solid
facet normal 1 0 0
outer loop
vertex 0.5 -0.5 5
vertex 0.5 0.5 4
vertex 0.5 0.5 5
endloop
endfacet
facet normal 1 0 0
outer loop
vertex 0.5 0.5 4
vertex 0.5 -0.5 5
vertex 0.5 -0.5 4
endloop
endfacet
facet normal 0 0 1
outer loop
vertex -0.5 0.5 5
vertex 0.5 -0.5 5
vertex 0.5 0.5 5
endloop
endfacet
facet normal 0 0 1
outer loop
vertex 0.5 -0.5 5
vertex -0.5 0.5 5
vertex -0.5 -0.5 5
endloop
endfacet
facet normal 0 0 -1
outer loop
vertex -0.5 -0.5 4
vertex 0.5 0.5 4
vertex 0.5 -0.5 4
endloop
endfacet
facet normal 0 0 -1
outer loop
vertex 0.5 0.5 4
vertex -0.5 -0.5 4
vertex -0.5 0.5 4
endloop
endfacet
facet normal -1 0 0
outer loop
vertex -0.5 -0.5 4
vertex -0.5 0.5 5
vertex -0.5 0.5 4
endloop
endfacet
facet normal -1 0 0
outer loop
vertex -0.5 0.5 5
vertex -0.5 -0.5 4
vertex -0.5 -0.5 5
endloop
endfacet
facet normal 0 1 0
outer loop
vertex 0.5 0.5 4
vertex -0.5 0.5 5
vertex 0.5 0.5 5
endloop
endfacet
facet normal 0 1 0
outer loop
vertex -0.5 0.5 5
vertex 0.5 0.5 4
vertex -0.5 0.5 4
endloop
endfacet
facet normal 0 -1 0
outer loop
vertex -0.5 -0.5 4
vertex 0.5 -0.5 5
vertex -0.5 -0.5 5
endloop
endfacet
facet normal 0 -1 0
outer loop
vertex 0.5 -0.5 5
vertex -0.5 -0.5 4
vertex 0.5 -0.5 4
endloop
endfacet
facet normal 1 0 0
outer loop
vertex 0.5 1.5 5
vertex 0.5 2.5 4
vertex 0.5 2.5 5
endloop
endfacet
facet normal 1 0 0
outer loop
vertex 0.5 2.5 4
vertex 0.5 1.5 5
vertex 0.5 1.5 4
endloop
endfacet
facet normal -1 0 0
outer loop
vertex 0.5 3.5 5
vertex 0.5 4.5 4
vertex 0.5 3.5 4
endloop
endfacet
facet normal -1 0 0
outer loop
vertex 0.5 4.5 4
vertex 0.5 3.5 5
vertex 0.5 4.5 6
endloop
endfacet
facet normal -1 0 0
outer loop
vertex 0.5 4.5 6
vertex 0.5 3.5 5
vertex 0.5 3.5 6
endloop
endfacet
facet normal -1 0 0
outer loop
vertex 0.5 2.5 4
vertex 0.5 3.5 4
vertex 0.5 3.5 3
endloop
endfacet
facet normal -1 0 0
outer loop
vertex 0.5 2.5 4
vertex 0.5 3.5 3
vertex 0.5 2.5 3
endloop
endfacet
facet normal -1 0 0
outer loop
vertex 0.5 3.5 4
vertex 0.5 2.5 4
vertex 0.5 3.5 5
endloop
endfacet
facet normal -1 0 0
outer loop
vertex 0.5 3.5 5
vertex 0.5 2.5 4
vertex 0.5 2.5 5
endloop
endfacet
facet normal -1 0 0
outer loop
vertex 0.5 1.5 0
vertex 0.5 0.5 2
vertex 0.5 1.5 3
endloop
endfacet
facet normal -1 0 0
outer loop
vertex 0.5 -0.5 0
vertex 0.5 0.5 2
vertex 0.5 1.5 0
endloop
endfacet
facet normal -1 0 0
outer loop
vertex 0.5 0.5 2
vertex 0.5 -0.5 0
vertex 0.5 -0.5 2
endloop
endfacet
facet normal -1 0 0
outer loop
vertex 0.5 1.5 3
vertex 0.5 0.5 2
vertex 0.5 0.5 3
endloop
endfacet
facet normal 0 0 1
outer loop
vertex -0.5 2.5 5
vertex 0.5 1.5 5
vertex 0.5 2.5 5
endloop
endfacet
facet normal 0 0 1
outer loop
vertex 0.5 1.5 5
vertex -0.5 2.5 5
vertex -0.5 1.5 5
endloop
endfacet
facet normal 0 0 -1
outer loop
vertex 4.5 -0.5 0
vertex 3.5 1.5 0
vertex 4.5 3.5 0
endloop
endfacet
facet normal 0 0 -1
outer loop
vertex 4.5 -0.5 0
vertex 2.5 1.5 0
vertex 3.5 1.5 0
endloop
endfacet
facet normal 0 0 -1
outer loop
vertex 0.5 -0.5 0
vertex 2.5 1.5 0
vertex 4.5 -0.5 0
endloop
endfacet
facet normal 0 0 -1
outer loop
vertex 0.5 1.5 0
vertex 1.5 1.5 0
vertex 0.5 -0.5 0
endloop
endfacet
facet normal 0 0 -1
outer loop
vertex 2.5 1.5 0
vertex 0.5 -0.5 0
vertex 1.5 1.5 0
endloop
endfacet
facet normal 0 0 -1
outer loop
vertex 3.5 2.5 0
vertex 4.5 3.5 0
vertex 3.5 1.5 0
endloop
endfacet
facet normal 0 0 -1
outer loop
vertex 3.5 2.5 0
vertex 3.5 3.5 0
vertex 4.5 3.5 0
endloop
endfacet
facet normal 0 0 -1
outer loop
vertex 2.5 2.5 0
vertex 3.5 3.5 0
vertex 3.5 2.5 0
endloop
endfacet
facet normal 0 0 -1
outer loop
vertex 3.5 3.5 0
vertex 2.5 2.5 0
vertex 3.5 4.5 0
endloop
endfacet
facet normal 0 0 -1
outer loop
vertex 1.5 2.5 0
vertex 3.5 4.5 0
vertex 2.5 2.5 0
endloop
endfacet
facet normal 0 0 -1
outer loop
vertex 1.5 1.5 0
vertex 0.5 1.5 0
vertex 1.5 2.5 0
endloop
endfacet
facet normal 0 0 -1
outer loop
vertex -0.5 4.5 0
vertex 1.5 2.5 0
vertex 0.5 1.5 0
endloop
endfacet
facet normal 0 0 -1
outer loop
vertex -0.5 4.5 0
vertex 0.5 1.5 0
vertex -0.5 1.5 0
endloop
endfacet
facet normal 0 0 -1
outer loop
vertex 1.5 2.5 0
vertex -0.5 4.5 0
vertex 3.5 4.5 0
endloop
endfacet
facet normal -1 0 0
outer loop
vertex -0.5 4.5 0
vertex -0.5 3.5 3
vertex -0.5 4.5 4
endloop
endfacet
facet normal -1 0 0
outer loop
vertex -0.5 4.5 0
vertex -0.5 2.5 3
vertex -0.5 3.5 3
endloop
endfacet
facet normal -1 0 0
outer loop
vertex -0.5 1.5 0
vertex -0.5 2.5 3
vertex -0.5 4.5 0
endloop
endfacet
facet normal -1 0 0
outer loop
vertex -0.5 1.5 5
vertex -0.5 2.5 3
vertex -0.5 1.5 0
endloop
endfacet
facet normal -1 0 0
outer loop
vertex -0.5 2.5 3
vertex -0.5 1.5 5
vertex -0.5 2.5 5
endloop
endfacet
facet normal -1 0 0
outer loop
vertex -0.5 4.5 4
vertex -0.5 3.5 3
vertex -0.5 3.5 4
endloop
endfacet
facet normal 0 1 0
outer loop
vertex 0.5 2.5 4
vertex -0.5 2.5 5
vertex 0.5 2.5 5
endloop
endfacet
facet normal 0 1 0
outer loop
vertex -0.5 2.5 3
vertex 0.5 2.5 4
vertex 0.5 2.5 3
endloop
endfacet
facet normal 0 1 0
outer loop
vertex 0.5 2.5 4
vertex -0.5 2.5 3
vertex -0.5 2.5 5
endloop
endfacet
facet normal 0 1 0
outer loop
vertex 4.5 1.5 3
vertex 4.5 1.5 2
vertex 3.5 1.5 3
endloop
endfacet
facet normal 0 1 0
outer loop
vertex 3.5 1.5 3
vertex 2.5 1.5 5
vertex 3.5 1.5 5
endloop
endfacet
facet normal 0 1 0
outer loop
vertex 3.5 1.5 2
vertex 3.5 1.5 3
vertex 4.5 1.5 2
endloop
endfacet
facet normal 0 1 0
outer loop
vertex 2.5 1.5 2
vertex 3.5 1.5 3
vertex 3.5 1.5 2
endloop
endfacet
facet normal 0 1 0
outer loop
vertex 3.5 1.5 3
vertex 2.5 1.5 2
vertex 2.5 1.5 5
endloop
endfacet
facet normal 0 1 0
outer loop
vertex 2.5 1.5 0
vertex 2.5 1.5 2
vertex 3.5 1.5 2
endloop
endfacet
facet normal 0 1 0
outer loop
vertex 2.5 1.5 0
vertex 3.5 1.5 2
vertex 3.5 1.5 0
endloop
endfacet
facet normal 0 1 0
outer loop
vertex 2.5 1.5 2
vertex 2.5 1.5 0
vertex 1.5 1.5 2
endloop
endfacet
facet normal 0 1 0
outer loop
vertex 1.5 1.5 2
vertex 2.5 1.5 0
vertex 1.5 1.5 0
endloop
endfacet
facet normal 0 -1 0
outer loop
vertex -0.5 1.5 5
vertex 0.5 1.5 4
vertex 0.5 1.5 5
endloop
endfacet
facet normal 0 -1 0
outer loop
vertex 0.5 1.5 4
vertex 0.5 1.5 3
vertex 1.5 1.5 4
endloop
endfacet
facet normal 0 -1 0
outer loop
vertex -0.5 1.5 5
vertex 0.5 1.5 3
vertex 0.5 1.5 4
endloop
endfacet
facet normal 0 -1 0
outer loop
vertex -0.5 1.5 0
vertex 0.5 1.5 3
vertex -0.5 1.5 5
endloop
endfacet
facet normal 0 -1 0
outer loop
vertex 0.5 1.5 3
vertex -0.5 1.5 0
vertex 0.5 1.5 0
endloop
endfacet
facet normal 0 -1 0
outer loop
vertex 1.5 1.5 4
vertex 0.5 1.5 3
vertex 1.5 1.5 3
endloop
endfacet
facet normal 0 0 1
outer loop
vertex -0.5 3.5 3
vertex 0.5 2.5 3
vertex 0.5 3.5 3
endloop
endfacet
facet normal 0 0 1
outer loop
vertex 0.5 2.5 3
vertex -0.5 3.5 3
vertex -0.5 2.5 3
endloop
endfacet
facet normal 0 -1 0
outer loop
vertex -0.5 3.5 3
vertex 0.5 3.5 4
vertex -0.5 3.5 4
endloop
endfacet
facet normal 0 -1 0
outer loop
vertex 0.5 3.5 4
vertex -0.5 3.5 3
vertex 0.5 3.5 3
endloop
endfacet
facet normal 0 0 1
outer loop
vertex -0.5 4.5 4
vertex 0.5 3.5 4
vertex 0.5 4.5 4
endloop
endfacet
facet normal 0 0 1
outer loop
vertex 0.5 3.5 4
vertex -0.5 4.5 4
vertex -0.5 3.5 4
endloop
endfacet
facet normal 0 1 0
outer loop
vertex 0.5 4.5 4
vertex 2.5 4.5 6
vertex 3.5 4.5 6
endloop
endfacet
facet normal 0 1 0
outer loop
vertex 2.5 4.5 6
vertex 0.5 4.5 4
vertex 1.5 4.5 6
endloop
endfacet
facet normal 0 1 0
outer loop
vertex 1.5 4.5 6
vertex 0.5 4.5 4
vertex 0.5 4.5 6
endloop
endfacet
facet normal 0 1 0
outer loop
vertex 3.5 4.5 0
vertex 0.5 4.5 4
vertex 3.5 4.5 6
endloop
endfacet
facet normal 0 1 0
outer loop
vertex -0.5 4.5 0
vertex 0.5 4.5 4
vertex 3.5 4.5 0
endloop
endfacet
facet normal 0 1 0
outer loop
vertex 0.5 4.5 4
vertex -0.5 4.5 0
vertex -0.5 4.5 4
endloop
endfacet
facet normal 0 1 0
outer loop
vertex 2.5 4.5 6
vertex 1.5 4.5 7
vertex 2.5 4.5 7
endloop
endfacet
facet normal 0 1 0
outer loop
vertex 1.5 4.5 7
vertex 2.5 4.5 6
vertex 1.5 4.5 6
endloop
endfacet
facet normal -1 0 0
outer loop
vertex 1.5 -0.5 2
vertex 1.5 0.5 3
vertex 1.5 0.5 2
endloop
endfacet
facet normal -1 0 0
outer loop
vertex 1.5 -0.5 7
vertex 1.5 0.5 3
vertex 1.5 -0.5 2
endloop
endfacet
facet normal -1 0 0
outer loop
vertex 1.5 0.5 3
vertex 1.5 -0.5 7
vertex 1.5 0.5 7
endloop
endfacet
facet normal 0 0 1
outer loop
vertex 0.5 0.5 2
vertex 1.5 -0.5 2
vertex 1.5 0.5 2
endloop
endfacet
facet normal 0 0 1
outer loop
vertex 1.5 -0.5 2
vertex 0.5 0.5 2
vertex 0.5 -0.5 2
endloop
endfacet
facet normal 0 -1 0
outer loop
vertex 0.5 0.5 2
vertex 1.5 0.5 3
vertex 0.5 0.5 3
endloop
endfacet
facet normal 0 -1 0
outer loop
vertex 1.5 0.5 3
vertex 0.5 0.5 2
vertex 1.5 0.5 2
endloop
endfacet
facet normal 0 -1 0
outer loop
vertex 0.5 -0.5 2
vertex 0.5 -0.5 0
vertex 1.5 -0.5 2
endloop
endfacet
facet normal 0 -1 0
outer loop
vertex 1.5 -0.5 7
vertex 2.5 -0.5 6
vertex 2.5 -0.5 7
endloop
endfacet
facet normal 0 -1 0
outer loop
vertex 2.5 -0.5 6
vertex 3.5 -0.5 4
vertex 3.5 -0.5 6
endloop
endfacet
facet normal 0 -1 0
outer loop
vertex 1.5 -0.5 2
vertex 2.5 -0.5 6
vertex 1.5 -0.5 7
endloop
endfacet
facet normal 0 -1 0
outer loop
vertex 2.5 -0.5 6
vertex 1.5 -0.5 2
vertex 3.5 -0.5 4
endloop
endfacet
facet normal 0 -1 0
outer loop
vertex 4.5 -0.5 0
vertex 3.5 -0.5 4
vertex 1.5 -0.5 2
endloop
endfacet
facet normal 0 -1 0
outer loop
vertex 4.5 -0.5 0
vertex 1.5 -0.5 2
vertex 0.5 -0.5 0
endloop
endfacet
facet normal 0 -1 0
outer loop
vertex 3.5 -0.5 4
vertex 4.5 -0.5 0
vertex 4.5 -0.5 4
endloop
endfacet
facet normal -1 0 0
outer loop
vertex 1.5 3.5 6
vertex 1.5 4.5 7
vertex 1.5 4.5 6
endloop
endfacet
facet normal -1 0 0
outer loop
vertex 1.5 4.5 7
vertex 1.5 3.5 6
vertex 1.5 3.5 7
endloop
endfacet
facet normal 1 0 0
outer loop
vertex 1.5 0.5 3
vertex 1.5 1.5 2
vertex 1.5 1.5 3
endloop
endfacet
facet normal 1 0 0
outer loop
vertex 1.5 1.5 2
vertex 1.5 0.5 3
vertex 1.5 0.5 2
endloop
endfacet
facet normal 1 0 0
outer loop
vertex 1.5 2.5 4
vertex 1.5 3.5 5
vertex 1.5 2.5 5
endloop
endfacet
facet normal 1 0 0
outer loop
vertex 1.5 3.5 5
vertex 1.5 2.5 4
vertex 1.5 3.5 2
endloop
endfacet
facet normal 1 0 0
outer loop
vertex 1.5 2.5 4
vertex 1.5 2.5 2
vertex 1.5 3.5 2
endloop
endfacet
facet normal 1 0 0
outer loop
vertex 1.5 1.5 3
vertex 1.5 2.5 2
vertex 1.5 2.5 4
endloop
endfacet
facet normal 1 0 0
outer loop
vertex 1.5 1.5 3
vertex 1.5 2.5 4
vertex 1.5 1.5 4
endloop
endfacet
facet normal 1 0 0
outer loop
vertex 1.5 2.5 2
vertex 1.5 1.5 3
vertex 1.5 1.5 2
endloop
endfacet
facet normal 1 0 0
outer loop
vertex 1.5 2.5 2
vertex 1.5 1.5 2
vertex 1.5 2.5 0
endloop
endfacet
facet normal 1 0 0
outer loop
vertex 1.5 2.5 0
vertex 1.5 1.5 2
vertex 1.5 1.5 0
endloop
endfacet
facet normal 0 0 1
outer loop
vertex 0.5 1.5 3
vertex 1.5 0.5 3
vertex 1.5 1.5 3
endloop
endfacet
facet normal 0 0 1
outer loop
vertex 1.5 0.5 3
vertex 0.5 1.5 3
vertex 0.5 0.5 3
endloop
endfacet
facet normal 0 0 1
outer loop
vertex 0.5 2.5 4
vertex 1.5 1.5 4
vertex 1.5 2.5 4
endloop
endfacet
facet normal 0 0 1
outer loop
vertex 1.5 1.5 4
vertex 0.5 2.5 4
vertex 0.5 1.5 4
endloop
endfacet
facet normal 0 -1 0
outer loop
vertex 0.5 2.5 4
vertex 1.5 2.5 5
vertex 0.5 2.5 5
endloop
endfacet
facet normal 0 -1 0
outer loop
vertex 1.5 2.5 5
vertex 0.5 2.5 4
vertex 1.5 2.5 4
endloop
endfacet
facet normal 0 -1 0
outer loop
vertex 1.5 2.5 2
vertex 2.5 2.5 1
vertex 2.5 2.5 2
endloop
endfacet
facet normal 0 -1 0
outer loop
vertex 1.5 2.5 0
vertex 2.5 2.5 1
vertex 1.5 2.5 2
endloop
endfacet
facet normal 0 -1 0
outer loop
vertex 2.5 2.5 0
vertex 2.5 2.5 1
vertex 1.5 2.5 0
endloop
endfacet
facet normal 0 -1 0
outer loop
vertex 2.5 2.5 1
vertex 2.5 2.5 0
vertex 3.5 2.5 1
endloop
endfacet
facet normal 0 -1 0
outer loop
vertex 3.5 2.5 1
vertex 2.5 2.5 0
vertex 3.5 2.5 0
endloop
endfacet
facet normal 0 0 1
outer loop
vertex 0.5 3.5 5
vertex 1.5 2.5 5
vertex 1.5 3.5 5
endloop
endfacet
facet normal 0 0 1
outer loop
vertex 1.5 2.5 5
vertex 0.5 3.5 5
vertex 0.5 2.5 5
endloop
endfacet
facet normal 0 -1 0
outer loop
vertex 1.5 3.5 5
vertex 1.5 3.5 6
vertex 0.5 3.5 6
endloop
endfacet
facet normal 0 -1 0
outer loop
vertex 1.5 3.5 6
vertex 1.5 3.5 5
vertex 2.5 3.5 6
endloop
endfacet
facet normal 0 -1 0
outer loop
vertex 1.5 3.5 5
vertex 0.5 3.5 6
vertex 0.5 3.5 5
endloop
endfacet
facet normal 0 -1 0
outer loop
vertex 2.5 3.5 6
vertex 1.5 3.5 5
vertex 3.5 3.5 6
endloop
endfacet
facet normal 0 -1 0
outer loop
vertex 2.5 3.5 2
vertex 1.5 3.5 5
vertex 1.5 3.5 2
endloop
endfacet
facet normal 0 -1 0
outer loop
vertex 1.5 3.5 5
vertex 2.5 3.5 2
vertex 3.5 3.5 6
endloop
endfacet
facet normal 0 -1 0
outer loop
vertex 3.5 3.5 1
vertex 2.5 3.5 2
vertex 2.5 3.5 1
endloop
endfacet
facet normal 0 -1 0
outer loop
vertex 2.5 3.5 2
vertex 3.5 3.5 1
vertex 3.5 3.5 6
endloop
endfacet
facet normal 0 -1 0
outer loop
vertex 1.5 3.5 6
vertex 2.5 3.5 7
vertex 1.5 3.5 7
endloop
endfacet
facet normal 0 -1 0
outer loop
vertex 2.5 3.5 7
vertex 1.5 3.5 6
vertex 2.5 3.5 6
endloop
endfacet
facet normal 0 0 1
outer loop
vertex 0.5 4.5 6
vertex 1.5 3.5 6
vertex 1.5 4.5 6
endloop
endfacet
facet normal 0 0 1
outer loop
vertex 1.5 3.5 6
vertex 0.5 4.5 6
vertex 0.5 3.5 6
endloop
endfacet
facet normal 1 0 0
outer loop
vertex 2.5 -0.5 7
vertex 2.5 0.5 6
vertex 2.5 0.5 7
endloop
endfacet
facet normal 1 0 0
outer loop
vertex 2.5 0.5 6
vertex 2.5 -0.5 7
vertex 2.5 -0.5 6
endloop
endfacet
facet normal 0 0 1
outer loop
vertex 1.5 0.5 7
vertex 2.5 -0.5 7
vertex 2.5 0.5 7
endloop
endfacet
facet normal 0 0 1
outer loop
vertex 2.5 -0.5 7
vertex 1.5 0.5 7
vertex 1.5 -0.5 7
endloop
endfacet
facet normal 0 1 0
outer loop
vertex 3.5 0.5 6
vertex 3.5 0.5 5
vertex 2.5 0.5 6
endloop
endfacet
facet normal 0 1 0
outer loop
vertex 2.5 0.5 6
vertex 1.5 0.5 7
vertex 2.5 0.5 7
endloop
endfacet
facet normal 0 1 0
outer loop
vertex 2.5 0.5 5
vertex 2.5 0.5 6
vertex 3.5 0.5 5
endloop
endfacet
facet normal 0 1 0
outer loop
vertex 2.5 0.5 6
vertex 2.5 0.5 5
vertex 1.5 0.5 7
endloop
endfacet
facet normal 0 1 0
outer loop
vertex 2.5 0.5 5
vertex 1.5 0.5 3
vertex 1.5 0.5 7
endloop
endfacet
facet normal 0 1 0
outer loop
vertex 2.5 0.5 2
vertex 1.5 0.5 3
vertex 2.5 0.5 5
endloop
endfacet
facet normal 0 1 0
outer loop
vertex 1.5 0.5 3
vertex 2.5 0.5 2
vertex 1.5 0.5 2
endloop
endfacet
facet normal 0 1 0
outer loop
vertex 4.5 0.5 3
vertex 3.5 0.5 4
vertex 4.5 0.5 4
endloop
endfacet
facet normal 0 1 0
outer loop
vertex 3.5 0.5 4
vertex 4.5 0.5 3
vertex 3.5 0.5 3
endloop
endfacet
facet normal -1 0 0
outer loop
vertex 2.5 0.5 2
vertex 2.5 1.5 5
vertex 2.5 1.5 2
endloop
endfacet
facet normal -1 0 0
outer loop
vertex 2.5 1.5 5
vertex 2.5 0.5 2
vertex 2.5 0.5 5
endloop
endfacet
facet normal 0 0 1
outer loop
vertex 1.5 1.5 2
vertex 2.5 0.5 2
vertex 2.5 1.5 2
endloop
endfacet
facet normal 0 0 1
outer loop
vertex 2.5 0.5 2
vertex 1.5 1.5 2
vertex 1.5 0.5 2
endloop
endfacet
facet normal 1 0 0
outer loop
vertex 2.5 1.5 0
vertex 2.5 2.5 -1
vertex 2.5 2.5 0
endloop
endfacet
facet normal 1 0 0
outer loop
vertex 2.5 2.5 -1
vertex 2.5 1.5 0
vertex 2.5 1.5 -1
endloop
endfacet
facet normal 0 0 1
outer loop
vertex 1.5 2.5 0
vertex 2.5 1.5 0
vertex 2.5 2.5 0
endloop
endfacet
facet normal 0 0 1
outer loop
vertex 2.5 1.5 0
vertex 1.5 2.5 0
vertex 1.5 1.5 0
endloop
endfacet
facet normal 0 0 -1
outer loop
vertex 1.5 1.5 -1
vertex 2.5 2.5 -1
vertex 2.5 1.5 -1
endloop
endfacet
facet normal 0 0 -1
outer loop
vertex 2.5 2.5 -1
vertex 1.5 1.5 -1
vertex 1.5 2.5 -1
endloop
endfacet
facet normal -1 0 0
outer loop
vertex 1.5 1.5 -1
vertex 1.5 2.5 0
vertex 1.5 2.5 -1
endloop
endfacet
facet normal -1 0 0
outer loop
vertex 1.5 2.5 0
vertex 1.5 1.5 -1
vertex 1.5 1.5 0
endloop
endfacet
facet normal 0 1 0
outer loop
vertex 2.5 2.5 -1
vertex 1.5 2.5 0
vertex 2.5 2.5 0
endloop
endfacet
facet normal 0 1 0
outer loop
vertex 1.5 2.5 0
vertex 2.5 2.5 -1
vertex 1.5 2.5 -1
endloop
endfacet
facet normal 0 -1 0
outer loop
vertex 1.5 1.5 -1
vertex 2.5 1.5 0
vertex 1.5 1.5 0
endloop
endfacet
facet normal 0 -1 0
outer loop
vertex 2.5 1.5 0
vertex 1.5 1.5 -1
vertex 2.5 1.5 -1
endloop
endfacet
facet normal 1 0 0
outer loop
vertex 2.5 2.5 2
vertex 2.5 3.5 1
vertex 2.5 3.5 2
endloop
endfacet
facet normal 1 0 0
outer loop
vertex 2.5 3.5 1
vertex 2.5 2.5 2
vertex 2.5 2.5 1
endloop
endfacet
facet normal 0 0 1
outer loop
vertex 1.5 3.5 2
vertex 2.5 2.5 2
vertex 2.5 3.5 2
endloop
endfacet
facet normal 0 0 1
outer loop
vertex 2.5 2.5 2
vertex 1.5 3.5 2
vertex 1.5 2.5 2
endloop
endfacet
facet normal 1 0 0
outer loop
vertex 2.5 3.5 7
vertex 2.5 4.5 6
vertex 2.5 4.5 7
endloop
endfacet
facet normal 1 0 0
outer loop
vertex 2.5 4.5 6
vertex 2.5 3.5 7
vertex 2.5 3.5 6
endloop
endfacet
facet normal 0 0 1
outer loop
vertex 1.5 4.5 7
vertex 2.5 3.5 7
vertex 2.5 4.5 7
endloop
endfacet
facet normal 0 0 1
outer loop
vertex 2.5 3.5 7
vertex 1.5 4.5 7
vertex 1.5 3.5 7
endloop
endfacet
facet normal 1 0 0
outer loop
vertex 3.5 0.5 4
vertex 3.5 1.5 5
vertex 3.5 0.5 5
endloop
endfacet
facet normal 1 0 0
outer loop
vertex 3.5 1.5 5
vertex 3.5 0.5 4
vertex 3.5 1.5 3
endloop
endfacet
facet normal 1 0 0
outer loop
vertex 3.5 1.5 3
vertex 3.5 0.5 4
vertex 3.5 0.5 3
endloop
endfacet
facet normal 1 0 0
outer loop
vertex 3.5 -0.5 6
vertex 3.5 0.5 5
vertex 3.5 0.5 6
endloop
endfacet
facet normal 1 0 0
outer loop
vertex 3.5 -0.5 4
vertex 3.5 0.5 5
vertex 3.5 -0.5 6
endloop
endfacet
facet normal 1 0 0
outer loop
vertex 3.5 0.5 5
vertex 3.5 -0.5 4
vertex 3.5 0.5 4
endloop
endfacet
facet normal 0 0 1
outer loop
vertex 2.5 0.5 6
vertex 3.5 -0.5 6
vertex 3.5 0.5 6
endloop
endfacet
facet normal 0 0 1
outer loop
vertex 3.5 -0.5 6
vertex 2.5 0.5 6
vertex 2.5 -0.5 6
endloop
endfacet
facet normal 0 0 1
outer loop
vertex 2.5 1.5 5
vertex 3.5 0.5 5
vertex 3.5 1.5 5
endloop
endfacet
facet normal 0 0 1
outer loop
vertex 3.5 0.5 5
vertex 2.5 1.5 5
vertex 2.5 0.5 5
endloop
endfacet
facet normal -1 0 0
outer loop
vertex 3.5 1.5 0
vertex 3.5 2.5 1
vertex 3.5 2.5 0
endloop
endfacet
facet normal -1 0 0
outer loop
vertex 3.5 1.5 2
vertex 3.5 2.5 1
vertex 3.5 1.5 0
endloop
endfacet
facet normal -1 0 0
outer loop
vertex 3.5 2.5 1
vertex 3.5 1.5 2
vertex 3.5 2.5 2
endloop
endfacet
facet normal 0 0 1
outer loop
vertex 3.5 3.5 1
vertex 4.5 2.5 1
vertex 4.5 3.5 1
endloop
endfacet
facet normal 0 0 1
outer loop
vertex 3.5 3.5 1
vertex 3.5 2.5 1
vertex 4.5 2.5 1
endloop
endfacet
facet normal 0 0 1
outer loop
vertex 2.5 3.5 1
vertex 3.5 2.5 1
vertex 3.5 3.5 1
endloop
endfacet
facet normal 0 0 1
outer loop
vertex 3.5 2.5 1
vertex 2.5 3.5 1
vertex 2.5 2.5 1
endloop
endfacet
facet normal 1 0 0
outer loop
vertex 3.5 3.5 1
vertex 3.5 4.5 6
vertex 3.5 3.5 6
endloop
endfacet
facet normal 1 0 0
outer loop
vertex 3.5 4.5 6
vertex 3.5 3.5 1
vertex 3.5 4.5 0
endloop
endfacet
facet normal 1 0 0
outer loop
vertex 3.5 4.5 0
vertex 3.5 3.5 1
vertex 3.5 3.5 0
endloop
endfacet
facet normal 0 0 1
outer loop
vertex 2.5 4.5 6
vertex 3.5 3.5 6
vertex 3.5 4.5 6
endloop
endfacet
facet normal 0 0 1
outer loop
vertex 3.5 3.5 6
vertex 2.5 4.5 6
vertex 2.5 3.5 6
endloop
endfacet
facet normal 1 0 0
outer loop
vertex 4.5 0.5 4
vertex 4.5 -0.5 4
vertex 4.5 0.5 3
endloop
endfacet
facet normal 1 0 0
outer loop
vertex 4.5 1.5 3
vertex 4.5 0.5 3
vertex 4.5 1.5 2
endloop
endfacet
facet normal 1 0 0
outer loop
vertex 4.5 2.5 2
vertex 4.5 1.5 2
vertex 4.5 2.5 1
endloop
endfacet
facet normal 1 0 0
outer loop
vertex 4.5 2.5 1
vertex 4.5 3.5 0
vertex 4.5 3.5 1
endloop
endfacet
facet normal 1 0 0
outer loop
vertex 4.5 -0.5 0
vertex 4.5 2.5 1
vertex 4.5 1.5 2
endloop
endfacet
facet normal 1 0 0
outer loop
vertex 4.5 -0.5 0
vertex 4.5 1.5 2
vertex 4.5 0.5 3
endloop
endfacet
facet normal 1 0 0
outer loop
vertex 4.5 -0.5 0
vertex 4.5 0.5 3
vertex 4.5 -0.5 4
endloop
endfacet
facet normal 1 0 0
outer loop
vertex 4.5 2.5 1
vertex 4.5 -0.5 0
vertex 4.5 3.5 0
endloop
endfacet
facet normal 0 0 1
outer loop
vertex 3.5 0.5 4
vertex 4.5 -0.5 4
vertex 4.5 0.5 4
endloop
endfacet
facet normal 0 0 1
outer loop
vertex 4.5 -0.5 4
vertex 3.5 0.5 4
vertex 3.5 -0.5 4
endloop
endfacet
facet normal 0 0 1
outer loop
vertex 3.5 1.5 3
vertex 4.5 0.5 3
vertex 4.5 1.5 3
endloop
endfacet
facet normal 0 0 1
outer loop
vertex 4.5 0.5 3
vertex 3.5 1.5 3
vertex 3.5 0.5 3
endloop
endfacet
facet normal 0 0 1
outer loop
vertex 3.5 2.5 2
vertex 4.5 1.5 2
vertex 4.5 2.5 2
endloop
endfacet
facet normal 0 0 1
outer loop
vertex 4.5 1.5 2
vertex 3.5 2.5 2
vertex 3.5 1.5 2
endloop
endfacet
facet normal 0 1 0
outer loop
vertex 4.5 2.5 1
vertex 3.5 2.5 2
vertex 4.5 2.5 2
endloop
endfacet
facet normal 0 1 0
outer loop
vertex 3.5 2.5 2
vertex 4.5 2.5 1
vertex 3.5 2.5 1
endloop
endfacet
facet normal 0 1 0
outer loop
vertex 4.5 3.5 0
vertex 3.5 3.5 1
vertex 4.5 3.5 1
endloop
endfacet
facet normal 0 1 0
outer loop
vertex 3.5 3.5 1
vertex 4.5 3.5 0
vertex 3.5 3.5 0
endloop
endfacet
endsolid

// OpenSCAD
union() {
    translate([0, 0, 4.5]) color([1, 0, 0]) cube([1, 1, 1], center=true);
    translate([0, 2, 2.5]) cube([1, 1, 5], center=true);
    translate([0, 3, 1.5]) cube([1, 1, 3], center=true);
    translate([0, 4, 2.0]) cube([1, 1, 4], center=true);
    translate([1, 0, 1.0]) cube([1, 1, 2], center=true);
    translate([1, 1, 1.5]) cube([1, 1, 3], center=true);
    translate([1, 2, 2.0]) cube([1, 1, 4], center=true);
    translate([1, 3, 2.5]) cube([1, 1, 5], center=true);
    translate([1, 4, 3.0]) cube([1, 1, 6], center=true);
    translate([2, 0, 3.5]) cube([1, 1, 7], center=true);
    translate([2, 1, 1.0]) cube([1, 1, 2], center=true);
    translate([2, 2, -0.5]) color([0, 0, 1]) cube([1, 1, 1], center=true);
    translate([2, 3, 1.0]) cube([1, 1, 2], center=true);
    translate([2, 4, 3.5]) cube([1, 1, 7], center=true);
    translate([3, 0, 3.0]) cube([1, 1, 6], center=true);
    translate([3, 1, 2.5]) cube([1, 1, 5], center=true);
    translate([3, 3, 0.5]) cube([1, 1, 1], center=true);
    translate([3, 4, 3.0]) cube([1, 1, 6], center=true);
    translate([4, 0, 2.0]) cube([1, 1, 4], center=true);
    translate([4, 1, 1.5]) cube([1, 1, 3], center=true);
    translate([4, 2, 1.0]) cube([1, 1, 2], center=true);
    translate([4, 3, 0.5]) cube([1, 1, 1], center=true);
}
